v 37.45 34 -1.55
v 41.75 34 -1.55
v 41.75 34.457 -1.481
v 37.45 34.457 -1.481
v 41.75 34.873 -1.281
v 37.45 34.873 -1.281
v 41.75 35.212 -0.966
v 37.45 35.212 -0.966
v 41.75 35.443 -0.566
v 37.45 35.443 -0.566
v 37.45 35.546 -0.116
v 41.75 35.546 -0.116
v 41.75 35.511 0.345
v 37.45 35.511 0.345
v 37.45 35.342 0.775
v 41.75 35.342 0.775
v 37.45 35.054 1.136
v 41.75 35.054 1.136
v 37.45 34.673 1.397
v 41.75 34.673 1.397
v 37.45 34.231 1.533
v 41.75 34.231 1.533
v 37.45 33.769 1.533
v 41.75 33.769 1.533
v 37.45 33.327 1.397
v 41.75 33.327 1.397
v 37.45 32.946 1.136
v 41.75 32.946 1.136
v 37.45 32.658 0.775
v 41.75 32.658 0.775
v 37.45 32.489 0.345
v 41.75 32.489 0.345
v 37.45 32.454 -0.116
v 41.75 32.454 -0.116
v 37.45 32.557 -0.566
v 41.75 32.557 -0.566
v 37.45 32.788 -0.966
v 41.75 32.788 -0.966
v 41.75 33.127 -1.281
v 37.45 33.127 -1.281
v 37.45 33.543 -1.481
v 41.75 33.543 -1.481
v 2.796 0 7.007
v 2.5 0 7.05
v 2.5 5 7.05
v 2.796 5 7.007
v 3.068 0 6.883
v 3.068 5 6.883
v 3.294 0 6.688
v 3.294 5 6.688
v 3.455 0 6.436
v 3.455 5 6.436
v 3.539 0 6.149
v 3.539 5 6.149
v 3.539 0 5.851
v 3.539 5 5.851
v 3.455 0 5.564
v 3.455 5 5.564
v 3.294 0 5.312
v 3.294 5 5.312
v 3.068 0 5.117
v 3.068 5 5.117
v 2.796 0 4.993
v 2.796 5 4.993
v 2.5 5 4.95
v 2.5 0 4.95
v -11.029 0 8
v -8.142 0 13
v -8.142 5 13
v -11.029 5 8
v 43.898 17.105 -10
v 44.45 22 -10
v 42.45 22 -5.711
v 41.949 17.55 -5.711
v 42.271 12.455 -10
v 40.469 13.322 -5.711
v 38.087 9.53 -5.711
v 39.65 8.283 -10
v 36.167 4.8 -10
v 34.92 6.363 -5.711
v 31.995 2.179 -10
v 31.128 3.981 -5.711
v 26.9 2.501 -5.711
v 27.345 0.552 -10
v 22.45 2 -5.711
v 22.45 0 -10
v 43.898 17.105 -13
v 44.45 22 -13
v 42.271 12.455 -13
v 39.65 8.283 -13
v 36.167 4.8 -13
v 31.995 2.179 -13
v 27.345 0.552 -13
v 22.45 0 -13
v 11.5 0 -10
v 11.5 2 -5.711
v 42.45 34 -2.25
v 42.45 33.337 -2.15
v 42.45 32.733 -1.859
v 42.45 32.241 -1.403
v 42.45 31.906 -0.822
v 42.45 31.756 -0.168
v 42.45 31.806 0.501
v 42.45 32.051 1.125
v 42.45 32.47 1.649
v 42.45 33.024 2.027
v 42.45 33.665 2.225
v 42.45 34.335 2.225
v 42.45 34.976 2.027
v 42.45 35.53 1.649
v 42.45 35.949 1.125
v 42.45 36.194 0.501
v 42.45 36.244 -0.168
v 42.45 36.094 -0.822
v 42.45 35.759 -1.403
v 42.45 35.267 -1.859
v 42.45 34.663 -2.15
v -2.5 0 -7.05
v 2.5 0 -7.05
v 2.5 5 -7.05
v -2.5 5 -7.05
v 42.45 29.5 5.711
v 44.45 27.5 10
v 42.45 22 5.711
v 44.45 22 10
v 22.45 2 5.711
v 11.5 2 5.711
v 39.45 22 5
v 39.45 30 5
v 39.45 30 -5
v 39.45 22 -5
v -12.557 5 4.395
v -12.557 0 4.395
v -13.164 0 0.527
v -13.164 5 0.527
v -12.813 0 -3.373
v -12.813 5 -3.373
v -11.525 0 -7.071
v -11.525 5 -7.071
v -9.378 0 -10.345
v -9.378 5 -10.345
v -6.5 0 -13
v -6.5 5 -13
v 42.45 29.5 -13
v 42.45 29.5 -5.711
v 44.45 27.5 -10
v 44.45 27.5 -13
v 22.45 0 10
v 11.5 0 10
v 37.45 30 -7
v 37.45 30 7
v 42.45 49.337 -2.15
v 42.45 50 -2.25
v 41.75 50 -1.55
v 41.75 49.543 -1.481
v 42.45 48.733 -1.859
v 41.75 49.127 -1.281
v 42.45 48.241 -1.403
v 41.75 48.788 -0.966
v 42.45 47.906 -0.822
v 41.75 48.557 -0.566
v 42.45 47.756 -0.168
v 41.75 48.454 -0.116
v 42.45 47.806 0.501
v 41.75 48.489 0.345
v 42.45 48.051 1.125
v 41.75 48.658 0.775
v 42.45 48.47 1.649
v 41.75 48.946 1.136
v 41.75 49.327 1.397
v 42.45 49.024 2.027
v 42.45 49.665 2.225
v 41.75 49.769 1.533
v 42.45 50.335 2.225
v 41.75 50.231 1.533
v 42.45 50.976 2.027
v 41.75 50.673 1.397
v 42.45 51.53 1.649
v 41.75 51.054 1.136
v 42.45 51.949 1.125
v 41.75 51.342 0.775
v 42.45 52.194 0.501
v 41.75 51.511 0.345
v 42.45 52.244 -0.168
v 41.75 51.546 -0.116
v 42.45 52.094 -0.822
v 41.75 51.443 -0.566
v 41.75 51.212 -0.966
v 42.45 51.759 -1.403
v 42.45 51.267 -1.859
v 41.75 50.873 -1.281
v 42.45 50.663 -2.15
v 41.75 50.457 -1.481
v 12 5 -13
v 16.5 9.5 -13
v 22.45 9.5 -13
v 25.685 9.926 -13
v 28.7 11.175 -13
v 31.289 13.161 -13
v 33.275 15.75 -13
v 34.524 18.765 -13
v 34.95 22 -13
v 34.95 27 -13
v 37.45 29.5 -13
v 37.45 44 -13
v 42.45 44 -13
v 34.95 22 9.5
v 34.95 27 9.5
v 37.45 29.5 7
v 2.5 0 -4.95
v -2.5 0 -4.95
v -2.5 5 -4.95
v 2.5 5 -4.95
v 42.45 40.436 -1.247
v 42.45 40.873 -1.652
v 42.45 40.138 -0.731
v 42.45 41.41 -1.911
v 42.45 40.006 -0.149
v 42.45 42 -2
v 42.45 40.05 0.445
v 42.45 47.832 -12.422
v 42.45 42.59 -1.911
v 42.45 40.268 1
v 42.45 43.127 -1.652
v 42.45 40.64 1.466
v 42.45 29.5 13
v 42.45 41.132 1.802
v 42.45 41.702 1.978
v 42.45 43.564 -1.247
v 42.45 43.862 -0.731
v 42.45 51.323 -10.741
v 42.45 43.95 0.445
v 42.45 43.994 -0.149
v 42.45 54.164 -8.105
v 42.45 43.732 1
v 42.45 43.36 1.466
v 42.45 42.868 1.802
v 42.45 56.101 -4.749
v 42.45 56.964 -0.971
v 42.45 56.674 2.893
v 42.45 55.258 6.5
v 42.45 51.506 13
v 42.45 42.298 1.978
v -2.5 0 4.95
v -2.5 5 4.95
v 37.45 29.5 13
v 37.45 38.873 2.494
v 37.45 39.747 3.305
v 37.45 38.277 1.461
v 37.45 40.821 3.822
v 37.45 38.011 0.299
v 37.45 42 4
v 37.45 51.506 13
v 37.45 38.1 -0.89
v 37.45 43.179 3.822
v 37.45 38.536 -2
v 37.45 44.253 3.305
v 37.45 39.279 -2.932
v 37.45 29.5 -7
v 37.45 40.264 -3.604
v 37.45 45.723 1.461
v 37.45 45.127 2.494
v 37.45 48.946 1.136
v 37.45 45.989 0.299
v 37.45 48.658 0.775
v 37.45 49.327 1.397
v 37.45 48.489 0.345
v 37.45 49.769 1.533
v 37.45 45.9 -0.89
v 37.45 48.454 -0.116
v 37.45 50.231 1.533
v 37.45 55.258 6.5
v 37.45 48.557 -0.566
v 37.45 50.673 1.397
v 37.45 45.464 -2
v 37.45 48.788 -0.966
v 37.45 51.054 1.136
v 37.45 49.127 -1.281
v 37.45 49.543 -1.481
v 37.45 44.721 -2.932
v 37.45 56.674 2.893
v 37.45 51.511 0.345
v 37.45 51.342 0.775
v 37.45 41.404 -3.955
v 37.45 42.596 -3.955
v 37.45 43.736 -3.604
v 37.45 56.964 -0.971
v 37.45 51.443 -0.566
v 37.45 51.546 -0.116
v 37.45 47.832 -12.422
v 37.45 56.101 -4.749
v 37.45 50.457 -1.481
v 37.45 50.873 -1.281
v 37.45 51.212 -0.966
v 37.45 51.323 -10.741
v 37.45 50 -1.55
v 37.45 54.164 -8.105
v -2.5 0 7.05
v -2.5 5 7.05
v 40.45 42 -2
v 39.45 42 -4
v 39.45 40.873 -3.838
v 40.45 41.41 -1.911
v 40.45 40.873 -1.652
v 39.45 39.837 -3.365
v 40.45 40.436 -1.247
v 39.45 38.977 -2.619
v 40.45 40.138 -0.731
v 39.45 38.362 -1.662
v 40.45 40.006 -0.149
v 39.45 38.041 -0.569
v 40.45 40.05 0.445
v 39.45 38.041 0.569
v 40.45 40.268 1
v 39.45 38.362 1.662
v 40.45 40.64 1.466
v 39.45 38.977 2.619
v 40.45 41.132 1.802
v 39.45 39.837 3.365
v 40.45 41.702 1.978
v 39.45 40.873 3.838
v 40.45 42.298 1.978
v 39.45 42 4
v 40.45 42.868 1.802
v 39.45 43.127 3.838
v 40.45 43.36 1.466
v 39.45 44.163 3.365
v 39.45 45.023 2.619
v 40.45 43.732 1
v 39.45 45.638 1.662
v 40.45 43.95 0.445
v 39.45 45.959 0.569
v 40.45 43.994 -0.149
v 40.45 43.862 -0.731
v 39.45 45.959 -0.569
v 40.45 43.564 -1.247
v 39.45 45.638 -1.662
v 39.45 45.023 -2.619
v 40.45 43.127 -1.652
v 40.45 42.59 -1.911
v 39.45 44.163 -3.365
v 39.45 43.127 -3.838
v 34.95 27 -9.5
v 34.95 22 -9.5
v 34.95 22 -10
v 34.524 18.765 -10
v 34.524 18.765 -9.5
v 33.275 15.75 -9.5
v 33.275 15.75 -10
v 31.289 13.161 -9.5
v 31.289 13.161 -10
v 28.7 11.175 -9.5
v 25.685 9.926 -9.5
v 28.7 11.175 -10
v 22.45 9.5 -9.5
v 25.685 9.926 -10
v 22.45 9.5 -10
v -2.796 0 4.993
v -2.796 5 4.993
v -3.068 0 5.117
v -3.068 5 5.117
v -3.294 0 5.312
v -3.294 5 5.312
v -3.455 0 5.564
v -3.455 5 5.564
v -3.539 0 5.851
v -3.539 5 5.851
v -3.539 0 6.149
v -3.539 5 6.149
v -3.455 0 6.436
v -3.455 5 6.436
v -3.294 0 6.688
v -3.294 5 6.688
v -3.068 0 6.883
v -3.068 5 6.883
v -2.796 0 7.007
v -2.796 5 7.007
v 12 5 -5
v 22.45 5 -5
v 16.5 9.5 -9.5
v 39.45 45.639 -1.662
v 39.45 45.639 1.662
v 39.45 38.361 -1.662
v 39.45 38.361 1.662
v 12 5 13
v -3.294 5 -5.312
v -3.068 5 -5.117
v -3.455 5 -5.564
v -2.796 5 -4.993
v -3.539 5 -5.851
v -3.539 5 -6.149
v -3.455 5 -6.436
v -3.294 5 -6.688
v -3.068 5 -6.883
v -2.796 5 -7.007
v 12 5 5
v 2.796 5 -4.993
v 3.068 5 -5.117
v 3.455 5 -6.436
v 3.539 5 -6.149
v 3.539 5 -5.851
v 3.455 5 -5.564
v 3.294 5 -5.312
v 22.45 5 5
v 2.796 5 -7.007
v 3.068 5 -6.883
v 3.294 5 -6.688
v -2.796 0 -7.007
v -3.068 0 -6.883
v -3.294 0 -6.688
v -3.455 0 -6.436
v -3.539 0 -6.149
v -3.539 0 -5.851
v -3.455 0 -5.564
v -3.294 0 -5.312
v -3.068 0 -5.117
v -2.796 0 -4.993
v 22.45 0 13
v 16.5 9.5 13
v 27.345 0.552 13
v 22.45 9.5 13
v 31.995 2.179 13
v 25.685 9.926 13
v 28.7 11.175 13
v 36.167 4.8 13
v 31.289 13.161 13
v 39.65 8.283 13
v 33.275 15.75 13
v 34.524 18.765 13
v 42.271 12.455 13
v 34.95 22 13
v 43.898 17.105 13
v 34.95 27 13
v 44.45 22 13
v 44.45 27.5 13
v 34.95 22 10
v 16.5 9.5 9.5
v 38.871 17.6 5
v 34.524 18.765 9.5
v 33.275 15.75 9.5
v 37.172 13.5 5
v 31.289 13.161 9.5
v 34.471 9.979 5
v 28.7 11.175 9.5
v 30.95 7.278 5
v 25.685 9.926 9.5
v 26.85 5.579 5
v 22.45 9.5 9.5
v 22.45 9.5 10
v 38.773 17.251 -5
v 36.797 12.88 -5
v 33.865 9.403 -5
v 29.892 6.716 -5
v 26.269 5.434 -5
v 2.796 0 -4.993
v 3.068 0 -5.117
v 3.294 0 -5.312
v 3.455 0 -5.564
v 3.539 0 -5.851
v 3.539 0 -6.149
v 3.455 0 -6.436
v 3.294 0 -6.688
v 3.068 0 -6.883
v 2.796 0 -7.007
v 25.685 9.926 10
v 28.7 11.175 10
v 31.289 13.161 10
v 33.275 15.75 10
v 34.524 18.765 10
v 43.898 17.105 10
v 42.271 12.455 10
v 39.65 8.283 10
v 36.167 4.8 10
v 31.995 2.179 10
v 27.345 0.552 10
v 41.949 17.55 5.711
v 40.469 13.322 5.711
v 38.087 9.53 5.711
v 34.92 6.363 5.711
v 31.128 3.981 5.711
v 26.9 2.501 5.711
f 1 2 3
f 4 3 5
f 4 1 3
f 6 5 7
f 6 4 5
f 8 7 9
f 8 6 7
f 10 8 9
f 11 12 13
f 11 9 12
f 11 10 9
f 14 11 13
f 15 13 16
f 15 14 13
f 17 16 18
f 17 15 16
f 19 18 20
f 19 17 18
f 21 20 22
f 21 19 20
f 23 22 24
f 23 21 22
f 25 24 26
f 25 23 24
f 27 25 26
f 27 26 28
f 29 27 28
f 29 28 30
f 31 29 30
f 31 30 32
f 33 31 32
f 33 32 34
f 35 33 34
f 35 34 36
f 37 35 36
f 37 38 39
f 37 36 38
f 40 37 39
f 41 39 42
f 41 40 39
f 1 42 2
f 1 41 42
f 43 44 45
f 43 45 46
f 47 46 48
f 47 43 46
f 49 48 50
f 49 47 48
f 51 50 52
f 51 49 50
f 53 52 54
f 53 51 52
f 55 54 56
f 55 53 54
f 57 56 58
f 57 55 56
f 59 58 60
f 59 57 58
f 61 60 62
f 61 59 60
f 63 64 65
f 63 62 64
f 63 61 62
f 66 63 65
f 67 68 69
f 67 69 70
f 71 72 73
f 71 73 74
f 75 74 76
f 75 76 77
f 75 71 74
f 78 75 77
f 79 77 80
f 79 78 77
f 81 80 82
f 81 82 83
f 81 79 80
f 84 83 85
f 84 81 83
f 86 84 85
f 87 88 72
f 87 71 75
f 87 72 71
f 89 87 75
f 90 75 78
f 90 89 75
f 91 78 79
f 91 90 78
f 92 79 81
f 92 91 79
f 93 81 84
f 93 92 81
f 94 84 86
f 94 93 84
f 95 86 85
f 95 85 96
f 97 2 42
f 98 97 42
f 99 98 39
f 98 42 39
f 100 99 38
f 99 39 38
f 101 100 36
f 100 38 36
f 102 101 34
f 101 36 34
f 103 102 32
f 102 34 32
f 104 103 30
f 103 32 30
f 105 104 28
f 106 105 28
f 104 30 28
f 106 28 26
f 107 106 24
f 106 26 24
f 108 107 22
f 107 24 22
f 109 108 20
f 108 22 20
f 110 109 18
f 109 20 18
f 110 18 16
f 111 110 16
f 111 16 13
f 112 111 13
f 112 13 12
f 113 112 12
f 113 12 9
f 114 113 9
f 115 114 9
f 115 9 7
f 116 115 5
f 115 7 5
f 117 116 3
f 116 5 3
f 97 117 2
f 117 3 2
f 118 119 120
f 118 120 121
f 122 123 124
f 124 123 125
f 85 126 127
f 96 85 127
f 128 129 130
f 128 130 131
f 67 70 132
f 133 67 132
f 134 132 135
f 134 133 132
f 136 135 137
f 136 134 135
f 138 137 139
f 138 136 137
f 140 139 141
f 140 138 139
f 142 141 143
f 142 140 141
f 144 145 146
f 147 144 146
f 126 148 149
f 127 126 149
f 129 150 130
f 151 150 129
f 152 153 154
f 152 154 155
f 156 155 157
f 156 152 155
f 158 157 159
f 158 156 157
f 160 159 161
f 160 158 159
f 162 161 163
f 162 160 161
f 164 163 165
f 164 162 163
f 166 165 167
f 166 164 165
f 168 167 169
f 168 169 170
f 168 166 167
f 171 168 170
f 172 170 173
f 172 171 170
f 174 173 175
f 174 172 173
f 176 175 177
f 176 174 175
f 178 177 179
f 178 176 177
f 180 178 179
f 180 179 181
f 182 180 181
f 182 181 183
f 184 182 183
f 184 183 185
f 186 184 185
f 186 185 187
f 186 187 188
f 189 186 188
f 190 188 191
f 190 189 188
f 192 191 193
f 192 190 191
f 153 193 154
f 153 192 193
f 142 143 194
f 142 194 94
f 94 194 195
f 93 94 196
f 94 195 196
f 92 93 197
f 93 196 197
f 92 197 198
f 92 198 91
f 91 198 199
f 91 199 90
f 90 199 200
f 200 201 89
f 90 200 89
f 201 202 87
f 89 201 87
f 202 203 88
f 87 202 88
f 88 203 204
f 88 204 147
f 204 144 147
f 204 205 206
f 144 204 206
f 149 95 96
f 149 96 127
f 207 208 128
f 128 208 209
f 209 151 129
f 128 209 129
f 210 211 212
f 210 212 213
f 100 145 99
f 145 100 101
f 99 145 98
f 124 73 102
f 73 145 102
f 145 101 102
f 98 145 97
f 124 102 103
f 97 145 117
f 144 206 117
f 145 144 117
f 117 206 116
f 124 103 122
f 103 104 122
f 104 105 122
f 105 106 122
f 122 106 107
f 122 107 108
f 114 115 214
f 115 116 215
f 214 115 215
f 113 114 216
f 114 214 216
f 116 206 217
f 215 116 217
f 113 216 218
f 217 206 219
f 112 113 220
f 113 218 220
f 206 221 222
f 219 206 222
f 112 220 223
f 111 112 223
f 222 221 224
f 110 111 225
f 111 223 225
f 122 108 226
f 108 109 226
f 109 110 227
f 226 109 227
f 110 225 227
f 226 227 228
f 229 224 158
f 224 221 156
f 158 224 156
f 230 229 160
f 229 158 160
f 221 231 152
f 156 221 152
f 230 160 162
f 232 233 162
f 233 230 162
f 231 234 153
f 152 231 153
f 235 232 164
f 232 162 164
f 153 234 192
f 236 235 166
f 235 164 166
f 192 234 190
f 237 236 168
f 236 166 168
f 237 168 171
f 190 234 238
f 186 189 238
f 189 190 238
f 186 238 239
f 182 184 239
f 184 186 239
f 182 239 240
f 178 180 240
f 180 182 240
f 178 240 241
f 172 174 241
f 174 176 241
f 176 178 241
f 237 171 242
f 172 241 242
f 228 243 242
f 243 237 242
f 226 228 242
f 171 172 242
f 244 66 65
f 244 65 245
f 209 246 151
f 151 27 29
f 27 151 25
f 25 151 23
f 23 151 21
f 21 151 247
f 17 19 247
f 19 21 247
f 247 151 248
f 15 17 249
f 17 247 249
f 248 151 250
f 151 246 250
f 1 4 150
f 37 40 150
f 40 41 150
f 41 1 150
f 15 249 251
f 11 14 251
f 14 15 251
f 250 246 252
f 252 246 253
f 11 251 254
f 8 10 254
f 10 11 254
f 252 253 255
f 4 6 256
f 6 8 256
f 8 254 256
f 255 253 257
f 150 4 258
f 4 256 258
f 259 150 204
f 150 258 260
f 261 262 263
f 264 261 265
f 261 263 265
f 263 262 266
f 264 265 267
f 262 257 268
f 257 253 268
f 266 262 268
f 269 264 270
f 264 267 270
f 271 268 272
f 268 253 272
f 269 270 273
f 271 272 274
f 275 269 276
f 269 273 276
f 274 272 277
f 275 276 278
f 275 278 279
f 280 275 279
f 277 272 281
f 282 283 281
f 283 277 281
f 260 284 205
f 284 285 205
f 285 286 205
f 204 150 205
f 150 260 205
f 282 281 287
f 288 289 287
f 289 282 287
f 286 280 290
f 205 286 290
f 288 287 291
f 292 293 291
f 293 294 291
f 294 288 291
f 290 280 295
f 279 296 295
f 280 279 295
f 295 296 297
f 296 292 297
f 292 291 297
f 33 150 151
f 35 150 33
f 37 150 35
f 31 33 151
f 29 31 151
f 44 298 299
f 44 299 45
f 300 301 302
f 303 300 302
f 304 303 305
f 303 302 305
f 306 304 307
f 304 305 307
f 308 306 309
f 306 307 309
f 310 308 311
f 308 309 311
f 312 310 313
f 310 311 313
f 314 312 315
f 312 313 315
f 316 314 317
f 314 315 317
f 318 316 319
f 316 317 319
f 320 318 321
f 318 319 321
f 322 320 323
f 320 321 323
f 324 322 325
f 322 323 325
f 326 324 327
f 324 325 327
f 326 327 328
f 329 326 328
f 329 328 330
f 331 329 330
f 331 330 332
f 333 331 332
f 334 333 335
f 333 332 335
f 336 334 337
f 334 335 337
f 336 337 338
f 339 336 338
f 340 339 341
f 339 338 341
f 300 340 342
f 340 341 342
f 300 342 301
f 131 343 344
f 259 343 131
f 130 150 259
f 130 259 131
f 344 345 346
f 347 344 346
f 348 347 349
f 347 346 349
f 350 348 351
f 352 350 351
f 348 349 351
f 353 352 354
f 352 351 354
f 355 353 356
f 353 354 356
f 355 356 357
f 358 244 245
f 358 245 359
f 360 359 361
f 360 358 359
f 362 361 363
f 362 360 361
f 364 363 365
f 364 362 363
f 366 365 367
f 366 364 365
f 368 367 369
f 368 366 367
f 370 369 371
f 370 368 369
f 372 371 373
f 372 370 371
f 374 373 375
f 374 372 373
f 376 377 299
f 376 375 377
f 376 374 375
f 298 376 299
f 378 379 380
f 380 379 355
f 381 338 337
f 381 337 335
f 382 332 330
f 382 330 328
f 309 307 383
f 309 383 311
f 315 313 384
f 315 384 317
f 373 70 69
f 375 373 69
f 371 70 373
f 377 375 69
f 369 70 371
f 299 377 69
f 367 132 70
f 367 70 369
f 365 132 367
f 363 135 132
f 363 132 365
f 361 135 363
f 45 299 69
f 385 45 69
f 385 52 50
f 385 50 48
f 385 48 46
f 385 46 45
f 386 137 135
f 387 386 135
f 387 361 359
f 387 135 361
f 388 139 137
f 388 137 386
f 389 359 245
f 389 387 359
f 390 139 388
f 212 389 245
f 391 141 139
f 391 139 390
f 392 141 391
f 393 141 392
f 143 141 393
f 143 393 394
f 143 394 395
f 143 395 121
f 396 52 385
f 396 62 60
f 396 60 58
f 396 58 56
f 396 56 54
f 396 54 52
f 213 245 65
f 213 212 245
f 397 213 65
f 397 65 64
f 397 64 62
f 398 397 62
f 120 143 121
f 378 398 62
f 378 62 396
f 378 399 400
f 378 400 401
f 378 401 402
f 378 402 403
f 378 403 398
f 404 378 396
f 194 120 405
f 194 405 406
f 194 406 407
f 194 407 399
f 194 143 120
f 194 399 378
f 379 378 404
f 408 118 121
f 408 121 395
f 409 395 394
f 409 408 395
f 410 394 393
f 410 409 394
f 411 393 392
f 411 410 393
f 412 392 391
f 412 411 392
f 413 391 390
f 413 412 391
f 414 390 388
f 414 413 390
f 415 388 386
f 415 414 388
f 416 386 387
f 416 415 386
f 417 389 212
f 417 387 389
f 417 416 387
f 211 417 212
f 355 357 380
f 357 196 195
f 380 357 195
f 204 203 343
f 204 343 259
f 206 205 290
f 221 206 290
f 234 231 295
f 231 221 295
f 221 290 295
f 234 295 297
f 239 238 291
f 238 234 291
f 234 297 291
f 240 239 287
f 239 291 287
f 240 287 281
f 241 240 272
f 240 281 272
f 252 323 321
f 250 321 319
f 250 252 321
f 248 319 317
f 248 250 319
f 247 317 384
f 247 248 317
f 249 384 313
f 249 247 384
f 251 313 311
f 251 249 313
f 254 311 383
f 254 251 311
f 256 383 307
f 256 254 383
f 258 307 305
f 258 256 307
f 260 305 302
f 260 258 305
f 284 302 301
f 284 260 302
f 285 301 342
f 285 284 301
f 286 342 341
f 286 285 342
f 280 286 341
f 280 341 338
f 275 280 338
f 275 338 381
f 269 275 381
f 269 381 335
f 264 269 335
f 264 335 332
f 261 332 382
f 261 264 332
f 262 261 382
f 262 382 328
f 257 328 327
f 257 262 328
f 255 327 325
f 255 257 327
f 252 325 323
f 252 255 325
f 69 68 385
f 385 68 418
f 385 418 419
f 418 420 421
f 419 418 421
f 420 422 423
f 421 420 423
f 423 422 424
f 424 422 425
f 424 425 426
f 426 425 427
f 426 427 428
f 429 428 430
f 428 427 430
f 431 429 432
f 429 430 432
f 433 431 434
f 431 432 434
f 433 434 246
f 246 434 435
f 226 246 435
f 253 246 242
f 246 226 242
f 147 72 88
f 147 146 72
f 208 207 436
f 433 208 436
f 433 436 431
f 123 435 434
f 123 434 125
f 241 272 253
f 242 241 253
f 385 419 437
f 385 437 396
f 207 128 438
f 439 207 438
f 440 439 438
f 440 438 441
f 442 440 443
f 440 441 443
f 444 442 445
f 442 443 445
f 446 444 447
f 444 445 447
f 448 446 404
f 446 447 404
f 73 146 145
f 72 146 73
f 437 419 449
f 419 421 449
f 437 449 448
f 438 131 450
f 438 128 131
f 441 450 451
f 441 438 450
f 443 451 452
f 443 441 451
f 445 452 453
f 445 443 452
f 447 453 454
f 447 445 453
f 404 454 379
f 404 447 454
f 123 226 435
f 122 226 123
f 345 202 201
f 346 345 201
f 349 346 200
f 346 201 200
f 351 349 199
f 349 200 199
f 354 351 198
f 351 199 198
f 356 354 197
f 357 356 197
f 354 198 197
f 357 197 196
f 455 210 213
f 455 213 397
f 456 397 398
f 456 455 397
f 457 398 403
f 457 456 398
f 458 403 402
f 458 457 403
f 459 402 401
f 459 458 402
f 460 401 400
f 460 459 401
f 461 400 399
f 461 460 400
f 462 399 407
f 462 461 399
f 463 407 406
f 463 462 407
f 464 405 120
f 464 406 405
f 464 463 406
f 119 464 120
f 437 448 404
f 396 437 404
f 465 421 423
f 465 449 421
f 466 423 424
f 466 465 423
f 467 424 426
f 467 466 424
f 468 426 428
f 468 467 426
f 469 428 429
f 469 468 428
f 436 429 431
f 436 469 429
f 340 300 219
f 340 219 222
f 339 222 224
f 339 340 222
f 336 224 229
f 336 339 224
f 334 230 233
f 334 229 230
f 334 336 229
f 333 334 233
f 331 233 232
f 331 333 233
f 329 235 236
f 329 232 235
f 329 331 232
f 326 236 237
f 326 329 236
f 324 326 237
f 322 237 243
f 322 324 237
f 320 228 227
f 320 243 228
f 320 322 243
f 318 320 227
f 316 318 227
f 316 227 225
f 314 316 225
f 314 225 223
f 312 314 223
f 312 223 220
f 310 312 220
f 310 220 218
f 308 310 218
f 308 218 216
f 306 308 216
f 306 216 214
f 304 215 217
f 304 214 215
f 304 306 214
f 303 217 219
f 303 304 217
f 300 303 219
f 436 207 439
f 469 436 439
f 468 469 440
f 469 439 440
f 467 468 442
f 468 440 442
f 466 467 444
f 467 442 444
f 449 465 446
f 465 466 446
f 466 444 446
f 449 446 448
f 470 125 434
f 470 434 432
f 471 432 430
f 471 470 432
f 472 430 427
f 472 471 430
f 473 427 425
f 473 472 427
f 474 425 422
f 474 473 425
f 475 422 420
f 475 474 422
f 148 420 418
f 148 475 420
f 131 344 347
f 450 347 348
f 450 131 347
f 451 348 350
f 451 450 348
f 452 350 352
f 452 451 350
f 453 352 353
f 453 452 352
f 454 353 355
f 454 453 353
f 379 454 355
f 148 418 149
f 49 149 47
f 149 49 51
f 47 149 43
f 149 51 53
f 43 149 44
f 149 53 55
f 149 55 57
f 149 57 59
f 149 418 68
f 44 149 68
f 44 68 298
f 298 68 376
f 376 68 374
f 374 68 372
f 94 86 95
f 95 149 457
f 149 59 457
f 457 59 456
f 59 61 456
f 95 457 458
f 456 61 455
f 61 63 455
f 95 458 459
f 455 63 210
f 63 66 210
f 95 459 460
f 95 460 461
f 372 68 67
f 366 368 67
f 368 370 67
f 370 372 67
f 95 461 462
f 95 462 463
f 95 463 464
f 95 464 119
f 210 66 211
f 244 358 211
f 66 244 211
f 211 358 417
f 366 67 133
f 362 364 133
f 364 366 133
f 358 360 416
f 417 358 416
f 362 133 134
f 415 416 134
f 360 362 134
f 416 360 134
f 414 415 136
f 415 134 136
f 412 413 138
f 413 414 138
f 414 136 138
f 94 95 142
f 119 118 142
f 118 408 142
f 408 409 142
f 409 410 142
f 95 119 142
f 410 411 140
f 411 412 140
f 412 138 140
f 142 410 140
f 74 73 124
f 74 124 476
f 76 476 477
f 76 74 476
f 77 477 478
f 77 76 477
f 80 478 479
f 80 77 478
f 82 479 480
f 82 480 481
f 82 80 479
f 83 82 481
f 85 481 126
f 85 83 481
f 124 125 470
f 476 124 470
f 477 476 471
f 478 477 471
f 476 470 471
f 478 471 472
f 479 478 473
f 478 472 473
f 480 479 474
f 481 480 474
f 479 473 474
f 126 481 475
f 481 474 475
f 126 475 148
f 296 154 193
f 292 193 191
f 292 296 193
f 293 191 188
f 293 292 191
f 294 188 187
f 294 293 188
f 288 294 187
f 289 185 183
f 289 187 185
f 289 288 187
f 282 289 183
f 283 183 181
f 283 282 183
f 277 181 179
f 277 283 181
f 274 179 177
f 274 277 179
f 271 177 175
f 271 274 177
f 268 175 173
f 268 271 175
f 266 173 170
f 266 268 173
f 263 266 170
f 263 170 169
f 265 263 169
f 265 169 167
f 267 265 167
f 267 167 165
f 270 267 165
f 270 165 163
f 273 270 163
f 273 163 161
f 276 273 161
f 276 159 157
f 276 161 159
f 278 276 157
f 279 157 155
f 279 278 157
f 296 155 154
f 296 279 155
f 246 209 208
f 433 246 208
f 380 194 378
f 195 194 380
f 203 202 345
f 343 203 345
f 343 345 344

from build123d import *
from OCP.BRepFilletAPI import BRepFilletAPI_MakeChamfer

# Parameters (mm, degrees)
BOSS_EXTRUDE1_DEPTH = 7
SKETCH2_R           = 2
SKETCH2_R_2         = 1.55
BOSS_EXTRUDE2_DEPTH = 7
BOSS_EXTRUDE3_START = -13
BOSS_EXTRUDE3_DEPTH = 26
CUT_EXTRUDE3_DEPTH  = 77.816681
CUT_EXTRUDE6_DEPTH  = 10
CUT_EXTRUDE8_START  = -2
CUT_EXTRUDE8_DEPTH  = 2
CUT_EXTRUDE10_START = 2
CUT_EXTRUDE10_DEPTH = 2
SKETCH17_W          = 3
SKETCH17_H          = 2.5
SWEEP1_START        = -13
SWEEP1_DEPTH        = 3
CHAMFER3_SIZE       = 4.289014
CHAMFER3_SIZE_2     = 2
CHAMFER1_SIZE       = 0.7
CHAMFER7_SIZE       = 2.5
CHAMFER8_SIZE       = 4.289014
CHAMFER8_SIZE_2     = 2
CHAMFER9_SIZE       = 5
SKETCH14_R          = 4
CUT_EXTRUDE12_DEPTH = 2
CHAMFER11_SIZE2     = 2
CHAMFER11_SIZE      = 1
CHAMFER12_SIZE      = 3
CHAMFER13_SIZE      = 5


# Read off the part's stored shape, not the designer's step: Sweep1
# Some blends are built 0.0001 mm under size
with BuildPart() as part:
    # Sketch1 → Boss-Extrude1 (new body)
    # profile 1 of 2: a face of its own
    with BuildSketch(Plane(origin=(0, 0, 0), x_dir=(1, 0, 0), z_dir=(0, 1, 0))):
        with BuildLine():
            Line((-6.5, 13), (37.45, 13))
            Line((37.45, 13), (37.45, -13))
            Line((37.45, -13), (0, -13))
            Line((0, -13), (-8.142276, -13))
            Line((-8.142276, -13), (-11.029027, -8))
            ThreePointArc((-11.029027, -8), (-12.813017, 3.373132), (-6.5, 13))
        make_face()
        with BuildLine():
            ThreePointArc((-2.5, 2), (-4.5, 0), (-2.5, -2))
            Line((-2.5, -2), (2.5, -2))
            ThreePointArc((2.5, -2), (4.5, 0), (2.5, 2))
            Line((2.5, 2), (-2.5, 2))
        make_face(mode=Mode.SUBTRACT)
        with BuildLine():
            ThreePointArc((2.5, -7.05), (3.55, -6), (2.5, -4.95))
            Line((2.5, -4.95), (-2.5, -4.95))
            ThreePointArc((-2.5, -4.95), (-3.55, -6), (-2.5, -7.05))
            Line((-2.5, -7.05), (2.5, -7.05))
        make_face(mode=Mode.SUBTRACT)
        with BuildLine():
            ThreePointArc((2.5, 4.95), (3.55, 6), (2.5, 7.05))
            Line((2.5, 7.05), (-2.5, 7.05))
            ThreePointArc((-2.5, 7.05), (-3.55, 6), (-2.5, 4.95))
            Line((-2.5, 4.95), (2.5, 4.95))
        make_face(mode=Mode.SUBTRACT)
    # profile 2 of 2: a face of its own
    with BuildSketch(Plane(origin=(0, 0, 0), x_dir=(1, 0, 0), z_dir=(0, 1, 0))):
        with BuildLine():
            Line((2.5, 2), (-2.5, 2))
            ThreePointArc((-2.5, 2), (-4.5, 0), (-2.5, -2))
            Line((-2.5, -2), (2.5, -2))
            ThreePointArc((2.5, -2), (4.5, 0), (2.5, 2))
        make_face()
    extrude(amount=BOSS_EXTRUDE1_DEPTH)

    # Sketch2 → Boss-Extrude2 (add)
    with BuildSketch(Plane(origin=(37.45, 0, 0), x_dir=(0, 0, -1), z_dir=(1, 0, 0))):
        with BuildLine():
            Line((-13, 51.505553), (-13, 0))
            Line((-13, 0), (13, 0))
            Line((13, 0), (13, 44))
            ThreePointArc((13, 44), (6.5, 55.25833), (-6.5, 55.25833))
            Line((-6.5, 55.25833), (-13, 51.505553))
        make_face()
        with Locations((0, 42)):
            Circle(SKETCH2_R, mode=Mode.SUBTRACT)
        with Locations((0, 50)):
            Circle(SKETCH2_R_2, mode=Mode.SUBTRACT)
        with Locations((0, 34)):
            Circle(SKETCH2_R_2, mode=Mode.SUBTRACT)
    extrude(amount=BOSS_EXTRUDE2_DEPTH)

    # Sketch3 → Boss-Extrude3 (add)
    with BuildSketch(Plane.XY.offset(BOSS_EXTRUDE3_START)):
        with BuildLine():
            Line((22.45, 7), (37.45, 7))
            Line((37.45, 7), (37.45, 22))
            ThreePointArc((37.45, 22), (33.056602, 11.393398), (22.45, 7))
        make_face()
    extrude(amount=BOSS_EXTRUDE3_DEPTH)

    # Sketch6 → Cut-Extrude3 (cut, through all)
    with BuildSketch(Plane(origin=(0, 0, -13), x_dir=(-1, 0, 0), z_dir=(0, 0, -1))):
        with BuildLine():
            Line((-22.45, 0), (-44.45, 0))
            Line((-44.45, 0), (-44.45, 22))
            ThreePointArc((-44.45, 22), (-38.006349, 6.443651), (-22.45, 0))
        make_face()
    extrude(amount=-CUT_EXTRUDE3_DEPTH, mode=Mode.SUBTRACT)

    # Sketch8 → Cut-Extrude6 (cut, symmetric)
    with BuildSketch(Plane(origin=(0, 0, 0), x_dir=(-1, 0, 0), z_dir=(0, 0, -1))):
        with BuildLine():
            Line((-37.45, 22), (-37.45, 30))
            Line((-37.45, 30), (-39.45, 30))
            Line((-39.45, 30), (-39.45, 22))
            ThreePointArc((-39.45, 22), (-34.470815, 9.979185), (-22.45, 5))
            Line((-22.45, 5), (-11.5, 5))
            Line((-11.5, 5), (-11.5, 7))
            Line((-11.5, 7), (-22.45, 7))
            ThreePointArc((-22.45, 7), (-33.056602, 11.393398), (-37.45, 22))
        make_face()
        with BuildLine():
            Line((-11.5, 0), (-22.45, 0))
            ThreePointArc((-22.45, 0), (-38.006349, 6.443651), (-44.45, 22))
            Line((-44.45, 22), (-44.45, 30))
            Line((-44.45, 30), (-42.45, 30))
            Line((-42.45, 30), (-42.45, 22))
            ThreePointArc((-42.45, 22), (-36.592136, 7.857864), (-22.45, 2))
            Line((-22.45, 2), (-11.5, 2))
            Line((-11.5, 2), (-11.5, 0))
        make_face()
    extrude(amount=CUT_EXTRUDE6_DEPTH, both=True, mode=Mode.SUBTRACT)

    # Sketch10 → Cut-Extrude8 (cut)
    with BuildSketch(Plane(origin=(0, 7, 0), x_dir=(1, 0, 0), z_dir=(0, 1, 0)).offset(CUT_EXTRUDE8_START)):
        with BuildLine():
            Line((11.5, 10), (11.5, 13))
            Line((11.5, 13), (-6.5, 13))
            ThreePointArc((-6.5, 13), (-12.813017, 3.373132), (-11.029027, -8))
            Line((-11.029027, -8), (-8.142276, -13))
            Line((-8.142276, -13), (11.5, -13))
            Line((11.5, -13), (11.5, -10))
            Line((11.5, -10), (11.5, 10))
        make_face()
    extrude(amount=CUT_EXTRUDE8_DEPTH, mode=Mode.SUBTRACT)

    # Sketch12 → Cut-Extrude10 (cut)
    with BuildSketch(Plane.ZY.offset(-44.45).offset(CUT_EXTRUDE10_START)):
        with BuildLine():
            Line((-13, 30), (13, 30))
            Line((13, 30), (13, 51.505553))
            Line((13, 51.505553), (6.5, 55.25833))
            ThreePointArc((6.5, 55.25833), (-6.5, 55.25833), (-13, 44))
            Line((-13, 44), (-13, 30))
        make_face()
    extrude(amount=-CUT_EXTRUDE10_DEPTH, mode=Mode.SUBTRACT)

    # Sweep2: sweep along a path in Sketch18
    with BuildLine(Plane.XY.offset(13)) as sweep2_path:
        Line((11.5, 7), (22.45, 7))
        ThreePointArc((22.45, 7), (33.056602, 11.393398), (37.45, 22))
        Line((37.45, 22), (37.45, 30))
    # Sketch17 → Sweep2 (sweep)
    with BuildSketch(Plane.ZY.offset(-11.5)):
        with Locations((11.5, 8.25)):
            Rectangle(SKETCH17_W, SKETCH17_H)
    sweep(path=sweep2_path.line)

    # Sweep1 outline → Sweep1 (add)
    with BuildSketch(Plane.XY.offset(SWEEP1_START)):
        with BuildLine():
            Line((22.45, 9.5), (11.5, 9.5))
            Line((11.5, 9.5), (11.5, 7))
            Line((11.5, 7), (22.45, 7))
            ThreePointArc((22.45, 7), (33.056602, 11.393398), (37.45, 22))
            Line((37.45, 22), (37.45, 30))
            Line((37.45, 30), (34.95, 30))
            Line((34.95, 30), (34.95, 22))
            ThreePointArc((34.95, 22), (31.288835, 13.161165), (22.45, 9.5))
        make_face()
    extrude(amount=SWEEP1_DEPTH)

    # Chamfer3
    chamfer3_edges_1 = [part.edges().sort_by_distance(p)[0] for p in [
        (42.45, 26, 10),
    ]]
    chamfer3_side_1 = [part.faces().sort_by_distance(p)[0] for p in [
        (42.45, 26, 9.96),
    ]]
    chamfer3_edges_2 = [part.edges().sort_by_distance(p)[0] for p in [
        (16.975, 2, 10),
    ]]
    chamfer3_side_2 = [part.faces().sort_by_distance(p)[0] for p in [
        (16.975, 1.96, 10),
    ]]
    chamfer3_edges_3 = [part.edges().sort_by_distance(p)[0] for p in [
        (36.592136, 7.857864, 10),
    ]]
    chamfer3_side_3 = [part.faces().sort_by_distance(p)[0] for p in [
        (36.62042, 7.82958, 10),
    ]]
    chamfer3 = BRepFilletAPI_MakeChamfer(part.part.solid().wrapped)
    for e in chamfer3_edges_1:
        chamfer3.Add(CHAMFER3_SIZE - 0.0001, CHAMFER3_SIZE_2 - 0.0001, e.wrapped, chamfer3_side_1[0].wrapped)
    for e in chamfer3_edges_2:
        chamfer3.Add(CHAMFER3_SIZE_2 - 0.0001, CHAMFER3_SIZE - 0.0001, e.wrapped, chamfer3_side_2[0].wrapped)
    for e in chamfer3_edges_3:
        chamfer3.Add(CHAMFER3_SIZE_2 - 0.0001, CHAMFER3_SIZE - 0.0001, e.wrapped, chamfer3_side_3[0].wrapped)
    add(Compound.cast(chamfer3.Shape()), mode=Mode.REPLACE)  # a hair under: the kernel refuses the full size

    # Chamfer4
    # the kernel refuses this chamfer: 5 mm, written as the material it adds along each edge
    with BuildSketch(Plane(origin=(39.45, 30, -10), x_dir=(-0.9996219169112968, 0, -0.027495876610586317), z_dir=(0, -1, 0))) as chamfer4_piece_1_section:
        with BuildLine():
            Line((5.143366, 0), (-0.282736, -5.135589))
            Line((-0.282736, -5.135589), (-0.382698, -5.132839))
            ThreePointArc((-0.382698, -5.132839), (-0.170646, -2.566989), (-0.099962, 0.00275))
            Line((-0.099962, 0.00275), (0.00275, 0.099962))
            ThreePointArc((0.00275, 0.099962), (2.572488, 0.029278), (5.146116, 0.099962))
            Line((5.146116, 0.099962), (5.143366, 0))
        make_face()
    chamfer4_piece_1 = extrude(amount=8, mode=Mode.PRIVATE)
    chamfer4_piece_1 = split(chamfer4_piece_1, bisect_by=Plane(origin=(34.95, 26, -8.320496), z_dir=(1, 0, 0)), keep=Keep.TOP, mode=Mode.PRIVATE)
    add(chamfer4_piece_1)
    with BuildSketch(Plane(origin=(22.45, 22, -10), x_dir=(1, 0, 0), z_dir=(0, 1, 0))) as chamfer4_piece_2_section:
        with BuildLine():
            Line((11.858579, 0.141421), (17.141421, -5.141421))
            Line((17.141421, -5.141421), (17.241421, -5.141421))
            ThreePointArc((17.241421, -5.141421), (17.1, -2.570711), (17.1, 0))
            Line((17.1, 0), (17, 0.1))
            ThreePointArc((17, 0.1), (14.429289, 0.1), (11.858579, 0.241421))
            Line((11.858579, 0.241421), (11.858579, 0.141421))
        make_face()
    chamfer4_piece_2 = revolve(axis=Axis((22.45, 22, -10), (0, 0, -1)), revolution_arc=90, mode=Mode.PRIVATE)
    chamfer4_piece_2 = chamfer4_piece_2 - Plane(origin=(22.45, 22, -8.725306), x_dir=(1.0, 4.5928914007453734e-11, 0), z_dir=(0, 0, -1)) * Cylinder(12.5, 69, mode=Mode.PRIVATE)
    add(chamfer4_piece_2)
    with BuildSketch(Plane(origin=(22.45, 5, -10), x_dir=(0, -0.02749587661058649, 0.9996219169112968), z_dir=(-1, 0, 0))) as chamfer4_piece_3_section:
        with BuildLine():
            Line((5.143366, 0), (-0.282736, 5.135589))
            Line((-0.282736, 5.135589), (-0.382698, 5.132839))
            ThreePointArc((-0.382698, 5.132839), (-0.170646, 2.566989), (-0.099962, -0.00275))
            Line((-0.099962, -0.00275), (0.00275, -0.099962))
            ThreePointArc((0.00275, -0.099962), (2.572488, -0.029278), (5.146116, -0.099962))
            Line((5.146116, -0.099962), (5.143366, 0))
        make_face()
    chamfer4_piece_3 = extrude(amount=10.95, mode=Mode.PRIVATE)
    chamfer4_piece_3 = split(chamfer4_piece_3, bisect_by=Plane(origin=(16.975, 9.5, -8.320496), z_dir=(0, -1, 0)), keep=Keep.TOP, mode=Mode.PRIVATE)
    add(chamfer4_piece_3)

    # Chamfer1
    chamfer1_edges = [part.edges().sort_by_distance(p)[0] for p in [
        (42.45, 34, 1.55),
        (42.45, 50, 1.55),
    ]]
    chamfer(chamfer1_edges, length=CHAMFER1_SIZE)

    # Chamfer7
    # the kernel refuses this chamfer: 2.5 mm, written as the material it takes off along each edge
    with BuildSketch(Plane(origin=(44.45, 30, 3.570793), x_dir=(-0.9996219169112968, 0.027495876610586282, 0), z_dir=(0, 0, 1))) as chamfer7_piece_1_section:
        Polygon((CHAMFER7_SIZE * 0.999621916911, CHAMFER7_SIZE * 0.0274958766106), (-CHAMFER7_SIZE * 0.0274958766106, CHAMFER7_SIZE * 0.999621916911), (0, 0), align=None)
    chamfer7_piece_1 = extrude(amount=15.858415, mode=Mode.PRIVATE)
    chamfer7_piece_1 = split(chamfer7_piece_1, bisect_by=Plane(origin=(42.45, 29.135704, 11.5), z_dir=(1, 0, 0)), keep=Keep.TOP, mode=Mode.PRIVATE)
    add(chamfer7_piece_1, mode=Mode.SUBTRACT)
    with BuildSketch(Plane(origin=(44.45, 30, -19.429207), x_dir=(-0.9996219169112968, 0.027495876610586282, 0), z_dir=(0, 0, 1))) as chamfer7_piece_2_section:
        Polygon((CHAMFER7_SIZE * 0.999621916911, CHAMFER7_SIZE * 0.0274958766106), (-CHAMFER7_SIZE * 0.0274958766106, CHAMFER7_SIZE * 0.999621916911), (0, 0), align=None)
    chamfer7_piece_2 = extrude(amount=15.858415, mode=Mode.PRIVATE)
    chamfer7_piece_2 = split(chamfer7_piece_2, bisect_by=Plane(origin=(42.45, 29.135704, -11.5), z_dir=(1, 0, 0)), keep=Keep.TOP, mode=Mode.PRIVATE)
    add(chamfer7_piece_2, mode=Mode.SUBTRACT)

    # Chamfer8
    chamfer8_edges_1 = [part.edges().sort_by_distance(p)[0] for p in [
        (42.45, 25.75, -10),
    ]]
    chamfer8_side_1 = [part.faces().sort_by_distance(p)[0] for p in [
        (42.45, 25.75, -9.96),
    ]]
    chamfer8_edges_2 = [part.edges().sort_by_distance(p)[0] for p in [
        (16.975, 2, -10),
    ]]
    chamfer8_side_2 = [part.faces().sort_by_distance(p)[0] for p in [
        (16.975, 2, -9.96),
    ]]
    chamfer8_edges_3 = [part.edges().sort_by_distance(p)[0] for p in [
        (36.592136, 7.857864, -10),
    ]]
    chamfer8_side_3 = [part.faces().sort_by_distance(p)[0] for p in [
        (36.62042, 7.82958, -10),
    ]]
    chamfer8 = BRepFilletAPI_MakeChamfer(part.part.solid().wrapped)
    for e in chamfer8_edges_1:
        chamfer8.Add(CHAMFER8_SIZE - 0.0001, CHAMFER8_SIZE_2 - 0.0001, e.wrapped, chamfer8_side_1[0].wrapped)
    for e in chamfer8_edges_2:
        chamfer8.Add(CHAMFER8_SIZE - 0.0001, CHAMFER8_SIZE_2 - 0.0001, e.wrapped, chamfer8_side_2[0].wrapped)
    for e in chamfer8_edges_3:
        chamfer8.Add(CHAMFER8_SIZE_2 - 0.0001, CHAMFER8_SIZE - 0.0001, e.wrapped, chamfer8_side_3[0].wrapped)
    add(Compound.cast(chamfer8.Shape()), mode=Mode.REPLACE)  # a hair under: the kernel refuses the full size

    # Chamfer9
    # the kernel refuses this chamfer: 5 mm, written as the material it adds along each edge
    with BuildSketch(Plane(origin=(39.45, 30, 10), x_dir=(-0.9996219169112968, 0, 0.027495876610586317), z_dir=(0, -1, 0))) as chamfer9_piece_1_section:
        Polygon((CHAMFER9_SIZE * 0.999621916911, CHAMFER9_SIZE * 0.0274958766106), (-CHAMFER9_SIZE * 0.0274958766106, CHAMFER9_SIZE * 0.999621916911), (0, 0), align=None)
    chamfer9_piece_1 = extrude(amount=8, mode=Mode.PRIVATE)
    chamfer9_piece_1 = split(chamfer9_piece_1, bisect_by=Plane(origin=(34.95, 27.933854, 7.772938), z_dir=(1, 0, 0)), keep=Keep.TOP, mode=Mode.PRIVATE)
    add(chamfer9_piece_1)
    with BuildSketch(Plane(origin=(22.45, 5, 10), x_dir=(0, 0.9996219169112968, 0.027495876610586324), z_dir=(-1, 0, 0))) as chamfer9_piece_2_section:
        Polygon((CHAMFER9_SIZE * 0.999621916911, CHAMFER9_SIZE * 0.0274958766106), (-CHAMFER9_SIZE * 0.0274958766106, CHAMFER9_SIZE * 0.999621916911), (0, 0), align=None)
    chamfer9_piece_2 = extrude(amount=10.95, mode=Mode.PRIVATE)
    chamfer9_piece_2 = split(chamfer9_piece_2, bisect_by=Plane(origin=(18.429736, 9.5, 8.798086), z_dir=(0, -1, 0)), keep=Keep.TOP, mode=Mode.PRIVATE)
    add(chamfer9_piece_2)
    with BuildSketch(Plane(origin=(22.45, 22, 10), x_dir=(1, 0, 0), z_dir=(0, 1, 0))) as chamfer9_piece_3_section:
        Polygon((17 - CHAMFER9_SIZE, 0), (17, CHAMFER9_SIZE), (17, 0), align=None)
    chamfer9_piece_3 = revolve(axis=Axis((22.45, 22, 10), (0, 0, -1)), revolution_arc=90, mode=Mode.PRIVATE)
    chamfer9_piece_3 = chamfer9_piece_3 - Plane(origin=(22.45, 22, 8.660678), x_dir=(0, -1, 0), z_dir=(0, 0, -1)) * Cylinder(12.5, 69, mode=Mode.PRIVATE)
    add(chamfer9_piece_3)

    # Sketch14 → Cut-Extrude12 (cut)
    with BuildSketch(Plane(origin=(37.45, 0, 0), x_dir=(0, 0, -1), z_dir=(1, 0, 0))):
        with Locations(Location((0, 42, 0), (0, 0, 180))):
            Circle(SKETCH14_R)
    extrude(amount=CUT_EXTRUDE12_DEPTH, mode=Mode.SUBTRACT)

    # Chamfer11
    chamfer11_edges = [part.edges().sort_by_distance(p)[0] for p in [
        (39.45, 42, 2),
    ]]
    chamfer11_side = [part.faces().sort_by_distance(p)[0] for p in [
        (39.47, 42, 2),
    ]]
    chamfer(chamfer11_edges, length=CHAMFER11_SIZE - 0.0001, length2=CHAMFER11_SIZE2 - 0.0001, reference=chamfer11_side[0])  # a hair under: the kernel refuses the full size

    # Chamfer12
    # the kernel refuses this chamfer: 3 mm, written as the material it takes off along each edge
    with BuildSketch(Plane(origin=(34.95, 30, -20.715049), x_dir=(-0.027495876610586768, -0.9996219169112968, 0), z_dir=(0, 0, 1))) as chamfer12_piece_1_section:
        Polygon((CHAMFER12_SIZE * 0.999621916911, CHAMFER12_SIZE * 0.0274958766106), (-CHAMFER12_SIZE * 0.0274958766106, CHAMFER12_SIZE * 0.999621916911), (0, 0), align=None)
    chamfer12_piece_1 = extrude(amount=18.930098, mode=Mode.PRIVATE)
    chamfer12_piece_1 = split(chamfer12_piece_1, bisect_by=Plane(origin=(37.45, 28.97392, -11.25), z_dir=(-1, 0, 0)), keep=Keep.TOP, mode=Mode.PRIVATE)
    add(chamfer12_piece_1, mode=Mode.SUBTRACT)
    with BuildSketch(Plane(origin=(34.95, 30, 1.784951), x_dir=(0.9996219169112965, 0.02749587661058676, 1.4233391824783543e-14), z_dir=(0, 0, 1))) as chamfer12_piece_2_section:
        Polygon((CHAMFER12_SIZE * 0.999621916911, -CHAMFER12_SIZE * 0.0274958766106), (-CHAMFER12_SIZE * 0.0274958766106, -CHAMFER12_SIZE * 0.999621916911), (0, 0), align=None)
    chamfer12_piece_2 = extrude(amount=18.930098, mode=Mode.PRIVATE)
    chamfer12_piece_2 = split(chamfer12_piece_2, bisect_by=Plane(origin=(37.45, 28.97392, 11.25), z_dir=(-1, 0, 0)), keep=Keep.TOP, mode=Mode.PRIVATE)
    add(chamfer12_piece_2, mode=Mode.SUBTRACT)

    # Chamfer13
    # the kernel refuses this chamfer: 5 mm, written as the material it takes off along each edge
    with BuildSketch(Plane(origin=(11.5, 9.5, 25.858415), x_dir=(0.9996219169112968, 0.027495876610586317, 1.5220159105039985e-15), z_dir=(0, 0, -1))) as chamfer13_piece_1_section:
        Polygon((CHAMFER13_SIZE * 0.999621916911, CHAMFER13_SIZE * 0.0274958766106), (-CHAMFER13_SIZE * 0.0274958766106, CHAMFER13_SIZE * 0.999621916911), (0, 0), align=None)
    chamfer13_piece_1 = extrude(amount=29.21683, mode=Mode.PRIVATE)
    chamfer13_piece_1 = split(chamfer13_piece_1, bisect_by=Plane(origin=(13.179504, 5, 11.25), z_dir=(0, 1, 0)), keep=Keep.TOP, mode=Mode.PRIVATE)
    add(chamfer13_piece_1, mode=Mode.SUBTRACT)
    with BuildSketch(Plane(origin=(11.5, 9.5, -25.858415), x_dir=(-0.027495876610586317, -0.9996219169112968, 0), z_dir=(0, 0, 1))) as chamfer13_piece_2_section:
        Polygon((CHAMFER13_SIZE * 0.999621916911, CHAMFER13_SIZE * 0.0274958766106), (-CHAMFER13_SIZE * 0.0274958766106, CHAMFER13_SIZE * 0.999621916911), (0, 0), align=None)
    chamfer13_piece_2 = extrude(amount=29.21683, mode=Mode.PRIVATE)
    chamfer13_piece_2 = split(chamfer13_piece_2, bisect_by=Plane(origin=(13.179504, 5, -11.25), z_dir=(0, 1, 0)), keep=Keep.TOP, mode=Mode.PRIVATE)
    add(chamfer13_piece_2, mode=Mode.SUBTRACT)


solid = part.part
